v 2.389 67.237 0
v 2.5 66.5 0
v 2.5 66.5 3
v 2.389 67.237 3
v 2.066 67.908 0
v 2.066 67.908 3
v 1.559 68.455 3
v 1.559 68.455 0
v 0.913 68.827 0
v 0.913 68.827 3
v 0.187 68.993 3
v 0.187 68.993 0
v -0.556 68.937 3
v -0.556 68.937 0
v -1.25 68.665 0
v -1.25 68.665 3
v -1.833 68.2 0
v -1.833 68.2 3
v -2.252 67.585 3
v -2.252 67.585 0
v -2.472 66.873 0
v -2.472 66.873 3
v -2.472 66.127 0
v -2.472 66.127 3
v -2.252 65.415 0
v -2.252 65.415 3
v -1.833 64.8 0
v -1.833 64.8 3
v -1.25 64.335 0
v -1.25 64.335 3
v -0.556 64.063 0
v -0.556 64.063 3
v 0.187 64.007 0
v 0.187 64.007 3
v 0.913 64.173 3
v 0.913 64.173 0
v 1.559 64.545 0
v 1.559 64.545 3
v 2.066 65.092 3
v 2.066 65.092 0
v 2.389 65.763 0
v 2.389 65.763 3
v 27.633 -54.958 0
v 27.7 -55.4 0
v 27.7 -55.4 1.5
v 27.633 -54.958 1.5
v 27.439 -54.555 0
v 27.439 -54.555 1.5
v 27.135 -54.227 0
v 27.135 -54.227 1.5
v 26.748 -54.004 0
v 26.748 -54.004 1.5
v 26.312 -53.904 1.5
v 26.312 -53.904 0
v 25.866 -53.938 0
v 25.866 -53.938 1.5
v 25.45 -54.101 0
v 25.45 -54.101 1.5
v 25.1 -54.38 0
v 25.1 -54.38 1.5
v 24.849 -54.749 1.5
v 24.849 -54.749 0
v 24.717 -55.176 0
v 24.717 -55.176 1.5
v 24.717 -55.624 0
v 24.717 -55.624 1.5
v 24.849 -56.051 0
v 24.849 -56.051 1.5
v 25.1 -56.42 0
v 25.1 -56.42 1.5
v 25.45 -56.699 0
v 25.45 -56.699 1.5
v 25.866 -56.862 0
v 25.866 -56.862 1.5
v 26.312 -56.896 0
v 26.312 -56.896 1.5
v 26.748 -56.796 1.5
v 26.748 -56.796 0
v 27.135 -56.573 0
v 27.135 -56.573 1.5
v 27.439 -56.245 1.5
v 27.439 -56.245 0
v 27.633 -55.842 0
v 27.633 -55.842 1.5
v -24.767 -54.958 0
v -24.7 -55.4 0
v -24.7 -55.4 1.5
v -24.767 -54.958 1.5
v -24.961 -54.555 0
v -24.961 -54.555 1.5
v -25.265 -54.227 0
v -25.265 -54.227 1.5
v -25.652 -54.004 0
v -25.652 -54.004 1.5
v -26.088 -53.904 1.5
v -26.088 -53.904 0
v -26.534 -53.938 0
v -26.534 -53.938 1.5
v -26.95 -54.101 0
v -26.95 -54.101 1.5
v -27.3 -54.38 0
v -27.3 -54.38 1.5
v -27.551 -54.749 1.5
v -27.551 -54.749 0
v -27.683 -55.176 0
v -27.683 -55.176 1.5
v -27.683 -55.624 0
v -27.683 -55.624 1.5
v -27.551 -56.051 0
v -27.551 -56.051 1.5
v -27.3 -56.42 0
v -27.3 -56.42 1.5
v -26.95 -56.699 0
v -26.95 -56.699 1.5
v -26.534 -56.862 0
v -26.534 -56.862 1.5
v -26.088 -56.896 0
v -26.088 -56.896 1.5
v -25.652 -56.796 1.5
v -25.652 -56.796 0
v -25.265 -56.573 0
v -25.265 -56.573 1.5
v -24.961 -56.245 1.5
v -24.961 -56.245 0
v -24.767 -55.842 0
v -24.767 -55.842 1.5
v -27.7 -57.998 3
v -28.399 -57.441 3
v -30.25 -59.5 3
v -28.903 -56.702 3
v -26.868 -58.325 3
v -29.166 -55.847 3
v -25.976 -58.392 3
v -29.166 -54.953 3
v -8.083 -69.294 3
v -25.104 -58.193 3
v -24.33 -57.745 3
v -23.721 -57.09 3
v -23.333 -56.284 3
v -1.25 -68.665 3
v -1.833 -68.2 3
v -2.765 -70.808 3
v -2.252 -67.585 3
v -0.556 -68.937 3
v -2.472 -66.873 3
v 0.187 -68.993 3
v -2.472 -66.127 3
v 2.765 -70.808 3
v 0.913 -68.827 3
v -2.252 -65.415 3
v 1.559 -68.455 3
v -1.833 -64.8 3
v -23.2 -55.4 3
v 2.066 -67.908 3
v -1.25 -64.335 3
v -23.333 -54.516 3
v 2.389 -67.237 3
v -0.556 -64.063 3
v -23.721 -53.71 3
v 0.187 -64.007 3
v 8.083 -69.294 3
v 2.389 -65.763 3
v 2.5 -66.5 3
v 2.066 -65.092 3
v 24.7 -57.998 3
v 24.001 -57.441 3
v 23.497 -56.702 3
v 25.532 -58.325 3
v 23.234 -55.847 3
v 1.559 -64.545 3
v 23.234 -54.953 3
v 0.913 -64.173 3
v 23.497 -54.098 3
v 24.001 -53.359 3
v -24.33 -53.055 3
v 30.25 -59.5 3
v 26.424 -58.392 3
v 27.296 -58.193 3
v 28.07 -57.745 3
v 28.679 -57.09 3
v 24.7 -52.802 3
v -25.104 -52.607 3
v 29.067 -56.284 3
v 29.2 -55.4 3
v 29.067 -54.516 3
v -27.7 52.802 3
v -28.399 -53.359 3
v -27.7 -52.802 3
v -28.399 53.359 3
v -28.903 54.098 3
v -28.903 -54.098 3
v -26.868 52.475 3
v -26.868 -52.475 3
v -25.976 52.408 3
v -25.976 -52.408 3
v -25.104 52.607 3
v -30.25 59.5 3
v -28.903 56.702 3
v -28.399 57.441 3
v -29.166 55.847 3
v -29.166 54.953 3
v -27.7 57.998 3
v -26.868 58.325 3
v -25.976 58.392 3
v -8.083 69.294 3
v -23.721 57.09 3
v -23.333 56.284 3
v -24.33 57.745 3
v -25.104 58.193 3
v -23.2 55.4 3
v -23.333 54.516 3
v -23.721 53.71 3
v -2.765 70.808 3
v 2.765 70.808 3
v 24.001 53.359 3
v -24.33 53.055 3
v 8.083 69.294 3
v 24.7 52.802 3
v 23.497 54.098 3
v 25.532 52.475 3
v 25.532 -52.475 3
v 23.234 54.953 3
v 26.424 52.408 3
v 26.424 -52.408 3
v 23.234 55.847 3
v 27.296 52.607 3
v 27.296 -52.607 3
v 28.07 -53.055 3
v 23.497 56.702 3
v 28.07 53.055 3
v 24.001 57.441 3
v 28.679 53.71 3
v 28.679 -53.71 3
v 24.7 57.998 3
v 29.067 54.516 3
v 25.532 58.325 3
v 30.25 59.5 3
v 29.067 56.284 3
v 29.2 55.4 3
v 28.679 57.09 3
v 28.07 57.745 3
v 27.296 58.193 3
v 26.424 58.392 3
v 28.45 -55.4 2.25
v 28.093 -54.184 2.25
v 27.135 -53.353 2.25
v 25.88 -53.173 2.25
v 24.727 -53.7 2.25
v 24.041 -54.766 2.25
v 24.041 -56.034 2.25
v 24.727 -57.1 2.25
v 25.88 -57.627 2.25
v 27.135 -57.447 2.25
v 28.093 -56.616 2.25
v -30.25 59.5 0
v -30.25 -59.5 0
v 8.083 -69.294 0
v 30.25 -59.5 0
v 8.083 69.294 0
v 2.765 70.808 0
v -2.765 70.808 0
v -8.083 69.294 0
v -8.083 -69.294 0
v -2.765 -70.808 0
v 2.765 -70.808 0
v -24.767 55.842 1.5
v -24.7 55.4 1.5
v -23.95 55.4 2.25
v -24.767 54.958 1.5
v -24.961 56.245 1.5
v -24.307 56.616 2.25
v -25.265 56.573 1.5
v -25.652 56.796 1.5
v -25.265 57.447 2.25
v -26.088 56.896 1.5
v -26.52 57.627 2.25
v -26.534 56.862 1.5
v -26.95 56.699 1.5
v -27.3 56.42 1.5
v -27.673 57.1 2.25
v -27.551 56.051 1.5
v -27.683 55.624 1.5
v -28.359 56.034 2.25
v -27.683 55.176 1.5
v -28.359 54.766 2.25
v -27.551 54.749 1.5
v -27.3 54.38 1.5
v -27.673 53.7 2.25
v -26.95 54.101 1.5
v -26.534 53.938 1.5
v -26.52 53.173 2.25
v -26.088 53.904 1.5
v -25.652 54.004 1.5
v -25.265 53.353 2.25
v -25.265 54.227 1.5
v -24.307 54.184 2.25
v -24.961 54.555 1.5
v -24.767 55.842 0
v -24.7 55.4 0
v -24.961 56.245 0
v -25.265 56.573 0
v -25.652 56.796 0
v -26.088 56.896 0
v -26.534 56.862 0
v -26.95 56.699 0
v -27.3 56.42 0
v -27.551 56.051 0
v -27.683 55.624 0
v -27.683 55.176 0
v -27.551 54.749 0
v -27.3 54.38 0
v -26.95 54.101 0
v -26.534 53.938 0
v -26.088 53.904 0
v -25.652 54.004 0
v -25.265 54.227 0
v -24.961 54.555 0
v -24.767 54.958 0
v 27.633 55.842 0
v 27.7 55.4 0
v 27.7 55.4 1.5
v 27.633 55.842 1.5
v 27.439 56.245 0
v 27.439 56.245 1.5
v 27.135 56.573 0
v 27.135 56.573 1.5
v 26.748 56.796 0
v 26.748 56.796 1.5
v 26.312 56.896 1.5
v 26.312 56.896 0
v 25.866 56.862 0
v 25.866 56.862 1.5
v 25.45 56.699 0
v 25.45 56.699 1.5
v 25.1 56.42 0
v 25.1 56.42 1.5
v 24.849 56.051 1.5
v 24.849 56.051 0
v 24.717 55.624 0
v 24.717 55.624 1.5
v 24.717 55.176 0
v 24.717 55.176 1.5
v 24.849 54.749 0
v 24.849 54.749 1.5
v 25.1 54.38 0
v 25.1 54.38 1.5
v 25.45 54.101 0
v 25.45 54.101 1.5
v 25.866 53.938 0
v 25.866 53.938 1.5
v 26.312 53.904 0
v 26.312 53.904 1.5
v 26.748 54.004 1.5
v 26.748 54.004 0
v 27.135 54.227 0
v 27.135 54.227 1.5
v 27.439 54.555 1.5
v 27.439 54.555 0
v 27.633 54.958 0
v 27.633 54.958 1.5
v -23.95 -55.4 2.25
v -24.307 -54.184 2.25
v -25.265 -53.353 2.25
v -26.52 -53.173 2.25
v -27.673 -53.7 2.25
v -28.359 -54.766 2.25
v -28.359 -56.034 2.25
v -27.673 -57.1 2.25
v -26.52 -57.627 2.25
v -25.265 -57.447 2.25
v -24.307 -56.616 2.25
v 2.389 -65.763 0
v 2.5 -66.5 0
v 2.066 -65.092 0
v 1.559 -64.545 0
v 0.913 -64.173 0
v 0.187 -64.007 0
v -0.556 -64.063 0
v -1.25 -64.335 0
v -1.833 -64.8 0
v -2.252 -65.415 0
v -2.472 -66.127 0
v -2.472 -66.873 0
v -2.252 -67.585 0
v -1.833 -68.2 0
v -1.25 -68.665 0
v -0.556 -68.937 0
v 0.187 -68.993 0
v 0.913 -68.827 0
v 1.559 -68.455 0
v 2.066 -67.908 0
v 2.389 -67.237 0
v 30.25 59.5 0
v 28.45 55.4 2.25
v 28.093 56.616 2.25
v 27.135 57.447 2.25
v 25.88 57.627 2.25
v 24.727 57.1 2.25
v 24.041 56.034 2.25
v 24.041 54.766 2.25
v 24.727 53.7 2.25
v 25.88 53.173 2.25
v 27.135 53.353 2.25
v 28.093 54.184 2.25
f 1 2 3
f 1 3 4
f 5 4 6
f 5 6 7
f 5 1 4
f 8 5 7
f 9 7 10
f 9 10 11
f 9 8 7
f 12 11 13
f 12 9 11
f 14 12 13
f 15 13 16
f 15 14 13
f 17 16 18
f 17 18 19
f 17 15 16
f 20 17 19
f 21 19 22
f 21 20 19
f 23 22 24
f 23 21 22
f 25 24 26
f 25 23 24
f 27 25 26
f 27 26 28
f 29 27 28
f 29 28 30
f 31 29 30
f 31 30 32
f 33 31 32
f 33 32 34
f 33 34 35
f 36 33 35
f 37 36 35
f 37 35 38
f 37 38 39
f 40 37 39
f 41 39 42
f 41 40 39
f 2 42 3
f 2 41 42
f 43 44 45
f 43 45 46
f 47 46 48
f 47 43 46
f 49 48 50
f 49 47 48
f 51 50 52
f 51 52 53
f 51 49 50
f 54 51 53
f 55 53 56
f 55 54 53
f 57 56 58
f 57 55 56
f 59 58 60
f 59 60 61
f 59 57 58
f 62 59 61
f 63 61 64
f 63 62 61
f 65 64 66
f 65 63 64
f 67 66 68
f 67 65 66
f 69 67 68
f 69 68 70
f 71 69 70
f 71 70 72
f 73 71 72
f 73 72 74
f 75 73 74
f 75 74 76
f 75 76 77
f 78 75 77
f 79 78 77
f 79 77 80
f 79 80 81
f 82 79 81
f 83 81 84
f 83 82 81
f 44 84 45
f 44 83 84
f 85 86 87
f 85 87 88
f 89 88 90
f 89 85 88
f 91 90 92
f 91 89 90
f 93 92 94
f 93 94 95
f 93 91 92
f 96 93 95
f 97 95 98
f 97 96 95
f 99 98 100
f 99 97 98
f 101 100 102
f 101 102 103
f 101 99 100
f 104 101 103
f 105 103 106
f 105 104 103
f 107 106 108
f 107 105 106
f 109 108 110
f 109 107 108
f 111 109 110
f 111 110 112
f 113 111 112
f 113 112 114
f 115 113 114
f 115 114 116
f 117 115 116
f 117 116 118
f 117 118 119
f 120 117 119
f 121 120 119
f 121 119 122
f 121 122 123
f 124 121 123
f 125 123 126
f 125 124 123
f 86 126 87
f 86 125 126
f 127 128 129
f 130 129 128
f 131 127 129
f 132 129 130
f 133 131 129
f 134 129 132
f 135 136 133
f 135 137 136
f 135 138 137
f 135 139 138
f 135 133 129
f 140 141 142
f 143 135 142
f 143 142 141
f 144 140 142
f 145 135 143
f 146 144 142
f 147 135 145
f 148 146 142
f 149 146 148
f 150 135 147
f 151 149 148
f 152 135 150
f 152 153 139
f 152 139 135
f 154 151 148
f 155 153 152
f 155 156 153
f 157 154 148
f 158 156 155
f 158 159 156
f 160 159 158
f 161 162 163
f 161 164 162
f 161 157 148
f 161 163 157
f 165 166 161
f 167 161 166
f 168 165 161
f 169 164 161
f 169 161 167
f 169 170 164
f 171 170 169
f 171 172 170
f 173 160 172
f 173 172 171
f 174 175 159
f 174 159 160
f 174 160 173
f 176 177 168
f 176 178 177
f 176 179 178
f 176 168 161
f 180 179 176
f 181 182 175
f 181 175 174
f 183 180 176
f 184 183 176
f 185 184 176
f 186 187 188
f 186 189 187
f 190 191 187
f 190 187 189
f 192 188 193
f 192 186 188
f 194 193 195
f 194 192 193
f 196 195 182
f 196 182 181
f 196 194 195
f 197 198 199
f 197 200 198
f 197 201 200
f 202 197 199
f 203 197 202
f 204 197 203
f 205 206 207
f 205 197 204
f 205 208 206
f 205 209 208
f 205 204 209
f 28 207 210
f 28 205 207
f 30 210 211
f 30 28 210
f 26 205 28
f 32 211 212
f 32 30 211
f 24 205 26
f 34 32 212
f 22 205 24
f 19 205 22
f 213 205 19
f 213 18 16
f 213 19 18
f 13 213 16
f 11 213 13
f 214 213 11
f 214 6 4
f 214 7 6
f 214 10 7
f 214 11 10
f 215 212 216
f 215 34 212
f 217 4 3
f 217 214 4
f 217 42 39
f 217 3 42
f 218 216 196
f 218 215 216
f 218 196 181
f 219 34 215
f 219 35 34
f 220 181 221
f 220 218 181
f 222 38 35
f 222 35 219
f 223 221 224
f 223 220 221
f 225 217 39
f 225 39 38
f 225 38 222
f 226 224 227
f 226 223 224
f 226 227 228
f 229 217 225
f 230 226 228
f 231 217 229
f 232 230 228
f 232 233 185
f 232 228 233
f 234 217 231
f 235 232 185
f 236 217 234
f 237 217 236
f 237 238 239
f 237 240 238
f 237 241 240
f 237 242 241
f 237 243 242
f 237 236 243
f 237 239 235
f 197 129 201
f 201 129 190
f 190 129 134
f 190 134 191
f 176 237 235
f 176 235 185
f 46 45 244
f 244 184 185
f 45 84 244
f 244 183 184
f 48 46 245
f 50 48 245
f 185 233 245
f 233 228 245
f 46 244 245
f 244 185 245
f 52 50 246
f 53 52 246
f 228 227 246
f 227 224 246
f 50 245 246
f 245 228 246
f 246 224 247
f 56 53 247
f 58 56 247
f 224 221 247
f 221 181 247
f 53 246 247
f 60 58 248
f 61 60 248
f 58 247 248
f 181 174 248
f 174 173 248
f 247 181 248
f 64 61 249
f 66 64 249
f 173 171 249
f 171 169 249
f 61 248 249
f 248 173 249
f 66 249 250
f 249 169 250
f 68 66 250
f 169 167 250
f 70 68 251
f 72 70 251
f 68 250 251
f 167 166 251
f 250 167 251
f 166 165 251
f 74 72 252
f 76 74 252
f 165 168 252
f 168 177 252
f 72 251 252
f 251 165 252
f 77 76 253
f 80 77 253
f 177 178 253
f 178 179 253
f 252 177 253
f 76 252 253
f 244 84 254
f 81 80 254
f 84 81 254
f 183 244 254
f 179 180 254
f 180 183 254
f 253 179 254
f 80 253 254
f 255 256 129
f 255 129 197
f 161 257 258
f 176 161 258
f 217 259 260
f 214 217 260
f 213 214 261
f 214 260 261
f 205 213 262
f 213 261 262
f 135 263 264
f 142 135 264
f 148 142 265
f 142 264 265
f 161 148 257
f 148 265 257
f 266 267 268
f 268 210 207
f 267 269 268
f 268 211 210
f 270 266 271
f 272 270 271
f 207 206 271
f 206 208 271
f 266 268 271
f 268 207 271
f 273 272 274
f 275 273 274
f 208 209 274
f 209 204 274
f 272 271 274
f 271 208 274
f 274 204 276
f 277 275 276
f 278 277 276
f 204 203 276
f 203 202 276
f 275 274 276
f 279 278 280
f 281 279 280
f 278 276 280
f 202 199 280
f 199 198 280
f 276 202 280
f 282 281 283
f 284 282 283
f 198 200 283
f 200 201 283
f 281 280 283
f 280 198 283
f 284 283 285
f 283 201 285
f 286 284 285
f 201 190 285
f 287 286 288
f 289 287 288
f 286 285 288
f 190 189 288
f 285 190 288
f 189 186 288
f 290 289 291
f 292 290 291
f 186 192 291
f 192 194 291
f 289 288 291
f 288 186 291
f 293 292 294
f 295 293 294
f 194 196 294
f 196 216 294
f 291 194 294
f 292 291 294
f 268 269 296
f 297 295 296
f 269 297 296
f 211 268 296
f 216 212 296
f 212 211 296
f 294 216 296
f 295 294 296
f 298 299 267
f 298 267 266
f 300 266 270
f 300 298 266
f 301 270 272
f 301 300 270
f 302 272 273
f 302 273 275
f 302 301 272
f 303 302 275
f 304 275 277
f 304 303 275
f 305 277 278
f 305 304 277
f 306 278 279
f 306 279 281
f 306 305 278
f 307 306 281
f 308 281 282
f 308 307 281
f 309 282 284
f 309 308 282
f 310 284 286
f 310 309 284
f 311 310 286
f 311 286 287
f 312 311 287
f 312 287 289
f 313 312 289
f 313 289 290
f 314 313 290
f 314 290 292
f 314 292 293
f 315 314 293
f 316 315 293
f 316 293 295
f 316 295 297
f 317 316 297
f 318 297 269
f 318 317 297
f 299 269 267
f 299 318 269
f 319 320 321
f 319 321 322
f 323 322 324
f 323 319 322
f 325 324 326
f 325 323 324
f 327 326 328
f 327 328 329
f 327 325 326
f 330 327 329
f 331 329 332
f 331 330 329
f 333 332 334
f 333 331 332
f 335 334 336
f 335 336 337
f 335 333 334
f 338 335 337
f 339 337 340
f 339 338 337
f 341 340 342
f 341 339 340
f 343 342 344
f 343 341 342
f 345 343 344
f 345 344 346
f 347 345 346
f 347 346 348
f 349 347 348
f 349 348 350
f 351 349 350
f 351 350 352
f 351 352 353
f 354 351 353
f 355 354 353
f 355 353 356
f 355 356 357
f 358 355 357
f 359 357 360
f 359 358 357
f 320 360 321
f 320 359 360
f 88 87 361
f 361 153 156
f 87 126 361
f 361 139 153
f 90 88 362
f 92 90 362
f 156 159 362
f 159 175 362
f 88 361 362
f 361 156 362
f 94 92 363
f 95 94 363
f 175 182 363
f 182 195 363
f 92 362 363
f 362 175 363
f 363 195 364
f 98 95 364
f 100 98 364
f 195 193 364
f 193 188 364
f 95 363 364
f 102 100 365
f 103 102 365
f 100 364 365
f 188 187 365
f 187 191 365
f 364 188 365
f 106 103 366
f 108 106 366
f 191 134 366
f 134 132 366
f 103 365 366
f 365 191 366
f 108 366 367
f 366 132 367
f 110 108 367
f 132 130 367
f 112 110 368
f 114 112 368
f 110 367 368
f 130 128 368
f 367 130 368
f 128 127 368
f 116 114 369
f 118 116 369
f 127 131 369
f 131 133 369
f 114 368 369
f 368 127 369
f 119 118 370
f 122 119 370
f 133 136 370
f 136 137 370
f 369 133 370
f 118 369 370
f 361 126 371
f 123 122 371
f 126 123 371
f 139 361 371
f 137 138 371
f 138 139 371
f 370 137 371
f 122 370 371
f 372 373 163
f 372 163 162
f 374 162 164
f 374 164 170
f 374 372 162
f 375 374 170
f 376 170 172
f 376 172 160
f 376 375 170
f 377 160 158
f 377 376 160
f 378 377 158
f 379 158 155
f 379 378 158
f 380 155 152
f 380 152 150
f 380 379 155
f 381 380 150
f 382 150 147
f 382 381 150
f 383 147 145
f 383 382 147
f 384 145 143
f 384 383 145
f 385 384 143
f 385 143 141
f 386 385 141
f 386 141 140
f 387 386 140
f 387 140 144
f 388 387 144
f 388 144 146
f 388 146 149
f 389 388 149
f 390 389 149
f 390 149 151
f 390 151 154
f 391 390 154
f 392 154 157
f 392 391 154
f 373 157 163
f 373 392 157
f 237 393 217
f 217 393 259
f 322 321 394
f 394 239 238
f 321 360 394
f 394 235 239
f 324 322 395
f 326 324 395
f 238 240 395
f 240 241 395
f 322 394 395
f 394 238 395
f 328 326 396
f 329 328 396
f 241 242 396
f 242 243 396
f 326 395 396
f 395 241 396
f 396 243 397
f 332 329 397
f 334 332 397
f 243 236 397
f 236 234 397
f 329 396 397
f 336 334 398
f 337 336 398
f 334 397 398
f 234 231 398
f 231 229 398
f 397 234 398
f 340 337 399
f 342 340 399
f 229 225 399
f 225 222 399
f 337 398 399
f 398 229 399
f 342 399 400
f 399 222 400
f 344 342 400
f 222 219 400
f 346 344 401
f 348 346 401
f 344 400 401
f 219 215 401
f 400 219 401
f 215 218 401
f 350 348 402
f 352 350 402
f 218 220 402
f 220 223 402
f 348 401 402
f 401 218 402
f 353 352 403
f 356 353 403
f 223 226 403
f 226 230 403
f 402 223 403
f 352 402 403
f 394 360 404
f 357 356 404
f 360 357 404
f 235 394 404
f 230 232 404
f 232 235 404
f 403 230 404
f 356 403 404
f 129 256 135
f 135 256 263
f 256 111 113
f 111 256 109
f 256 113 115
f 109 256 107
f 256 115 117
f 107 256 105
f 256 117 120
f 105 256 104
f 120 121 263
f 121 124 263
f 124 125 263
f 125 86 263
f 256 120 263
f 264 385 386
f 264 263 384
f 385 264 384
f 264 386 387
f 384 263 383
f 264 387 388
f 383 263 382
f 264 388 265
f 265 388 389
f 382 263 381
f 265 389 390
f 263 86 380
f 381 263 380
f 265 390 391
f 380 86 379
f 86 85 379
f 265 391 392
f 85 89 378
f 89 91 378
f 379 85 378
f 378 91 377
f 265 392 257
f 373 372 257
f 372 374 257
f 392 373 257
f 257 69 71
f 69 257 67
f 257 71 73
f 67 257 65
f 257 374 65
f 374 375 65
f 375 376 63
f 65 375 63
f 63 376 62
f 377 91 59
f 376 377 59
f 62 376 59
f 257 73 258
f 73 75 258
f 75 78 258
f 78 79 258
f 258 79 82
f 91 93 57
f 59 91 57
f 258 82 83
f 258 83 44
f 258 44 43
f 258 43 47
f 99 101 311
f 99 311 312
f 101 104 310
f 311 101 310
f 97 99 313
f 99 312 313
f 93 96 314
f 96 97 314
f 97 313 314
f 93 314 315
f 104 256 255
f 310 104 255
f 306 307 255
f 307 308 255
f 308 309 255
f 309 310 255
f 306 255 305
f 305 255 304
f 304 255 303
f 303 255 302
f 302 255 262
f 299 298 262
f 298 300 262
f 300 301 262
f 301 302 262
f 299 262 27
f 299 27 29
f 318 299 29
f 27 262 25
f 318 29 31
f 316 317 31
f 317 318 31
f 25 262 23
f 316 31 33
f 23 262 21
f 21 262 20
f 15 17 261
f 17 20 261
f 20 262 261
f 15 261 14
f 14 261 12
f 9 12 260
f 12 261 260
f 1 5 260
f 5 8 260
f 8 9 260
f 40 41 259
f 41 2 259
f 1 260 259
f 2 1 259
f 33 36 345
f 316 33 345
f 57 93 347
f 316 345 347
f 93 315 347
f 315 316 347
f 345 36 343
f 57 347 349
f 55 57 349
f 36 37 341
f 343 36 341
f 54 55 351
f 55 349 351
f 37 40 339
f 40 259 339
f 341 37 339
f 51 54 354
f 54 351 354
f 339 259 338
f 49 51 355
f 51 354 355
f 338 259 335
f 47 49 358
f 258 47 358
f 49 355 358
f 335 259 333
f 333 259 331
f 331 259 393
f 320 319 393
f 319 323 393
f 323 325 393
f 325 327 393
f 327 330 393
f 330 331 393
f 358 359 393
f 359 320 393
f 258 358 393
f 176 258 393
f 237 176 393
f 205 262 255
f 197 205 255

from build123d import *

# Parameters (mm, degrees)
F0_W     = 60.5
F0_H     = 119
F0_R     = 3
F0_R_2   = 2.5
F0_R_3   = 1.5
F1_DEPTH = 3
F2_SIZE  = 1.5


with BuildPart() as f1:
    # F0 (on Top) → F1 (new body)
    with BuildSketch(Plane.XY):
        Rectangle(F0_W, F0_H)
        with Locations((-26.2, -55.4)):
            Circle(F0_R, mode=Mode.SUBTRACT)
        with Locations((26.2, -55.4)):
            Circle(F0_R, mode=Mode.SUBTRACT)
        with Locations((-26.2, 55.4)):
            Circle(F0_R, mode=Mode.SUBTRACT)
        with Locations((26.2, 55.4)):
            Circle(F0_R, mode=Mode.SUBTRACT)
        with BuildLine():
            Line((-8.082679, 69.293996), (-30.25, 59.5))
            Line((-30.25, 59.5), (30.25, 59.5))
            Line((30.25, 59.5), (8.082679, 69.293996))
            ThreePointArc((8.082679, 69.293996), (0, 71), (-8.082679, 69.293996))
        make_face()
        with Locations((0, 66.5)):
            Circle(F0_R_2, mode=Mode.SUBTRACT)
        with BuildLine():
            Line((30.25, -59.5), (-30.25, -59.5))
            Line((-30.25, -59.5), (-8.082679, -69.293996))
            ThreePointArc((-8.082679, -69.293996), (0, -71), (8.082679, -69.293996))
            Line((8.082679, -69.293996), (30.25, -59.5))
        make_face()
        with Locations((0, -66.5)):
            Circle(F0_R_2, mode=Mode.SUBTRACT)
        with Locations((-26.2, 55.4)):
            Circle(F0_R)
        with Locations((-26.2, 55.4)):
            Circle(F0_R_3, mode=Mode.SUBTRACT)
        with Locations((26.2, 55.4)):
            Circle(F0_R)
        with Locations((26.2, 55.4)):
            Circle(F0_R_3, mode=Mode.SUBTRACT)
        with Locations((-26.2, -55.4)):
            Circle(F0_R)
        with Locations((-26.2, -55.4)):
            Circle(F0_R_3, mode=Mode.SUBTRACT)
        with Locations((26.2, -55.4)):
            Circle(F0_R)
        with Locations((26.2, -55.4)):
            Circle(F0_R_3, mode=Mode.SUBTRACT)
    extrude(amount=F1_DEPTH)

    # F2
    f2_edges = [f1.edges().sort_by_distance(p)[0] for p in [
        (-27.7, 55.4, 3),
        (24.7, 55.4, 3),
        (24.7, -55.4, 3),
        (-27.7, -55.4, 3),
    ]]
    chamfer(f2_edges, length=F2_SIZE)


solid = f1.part
